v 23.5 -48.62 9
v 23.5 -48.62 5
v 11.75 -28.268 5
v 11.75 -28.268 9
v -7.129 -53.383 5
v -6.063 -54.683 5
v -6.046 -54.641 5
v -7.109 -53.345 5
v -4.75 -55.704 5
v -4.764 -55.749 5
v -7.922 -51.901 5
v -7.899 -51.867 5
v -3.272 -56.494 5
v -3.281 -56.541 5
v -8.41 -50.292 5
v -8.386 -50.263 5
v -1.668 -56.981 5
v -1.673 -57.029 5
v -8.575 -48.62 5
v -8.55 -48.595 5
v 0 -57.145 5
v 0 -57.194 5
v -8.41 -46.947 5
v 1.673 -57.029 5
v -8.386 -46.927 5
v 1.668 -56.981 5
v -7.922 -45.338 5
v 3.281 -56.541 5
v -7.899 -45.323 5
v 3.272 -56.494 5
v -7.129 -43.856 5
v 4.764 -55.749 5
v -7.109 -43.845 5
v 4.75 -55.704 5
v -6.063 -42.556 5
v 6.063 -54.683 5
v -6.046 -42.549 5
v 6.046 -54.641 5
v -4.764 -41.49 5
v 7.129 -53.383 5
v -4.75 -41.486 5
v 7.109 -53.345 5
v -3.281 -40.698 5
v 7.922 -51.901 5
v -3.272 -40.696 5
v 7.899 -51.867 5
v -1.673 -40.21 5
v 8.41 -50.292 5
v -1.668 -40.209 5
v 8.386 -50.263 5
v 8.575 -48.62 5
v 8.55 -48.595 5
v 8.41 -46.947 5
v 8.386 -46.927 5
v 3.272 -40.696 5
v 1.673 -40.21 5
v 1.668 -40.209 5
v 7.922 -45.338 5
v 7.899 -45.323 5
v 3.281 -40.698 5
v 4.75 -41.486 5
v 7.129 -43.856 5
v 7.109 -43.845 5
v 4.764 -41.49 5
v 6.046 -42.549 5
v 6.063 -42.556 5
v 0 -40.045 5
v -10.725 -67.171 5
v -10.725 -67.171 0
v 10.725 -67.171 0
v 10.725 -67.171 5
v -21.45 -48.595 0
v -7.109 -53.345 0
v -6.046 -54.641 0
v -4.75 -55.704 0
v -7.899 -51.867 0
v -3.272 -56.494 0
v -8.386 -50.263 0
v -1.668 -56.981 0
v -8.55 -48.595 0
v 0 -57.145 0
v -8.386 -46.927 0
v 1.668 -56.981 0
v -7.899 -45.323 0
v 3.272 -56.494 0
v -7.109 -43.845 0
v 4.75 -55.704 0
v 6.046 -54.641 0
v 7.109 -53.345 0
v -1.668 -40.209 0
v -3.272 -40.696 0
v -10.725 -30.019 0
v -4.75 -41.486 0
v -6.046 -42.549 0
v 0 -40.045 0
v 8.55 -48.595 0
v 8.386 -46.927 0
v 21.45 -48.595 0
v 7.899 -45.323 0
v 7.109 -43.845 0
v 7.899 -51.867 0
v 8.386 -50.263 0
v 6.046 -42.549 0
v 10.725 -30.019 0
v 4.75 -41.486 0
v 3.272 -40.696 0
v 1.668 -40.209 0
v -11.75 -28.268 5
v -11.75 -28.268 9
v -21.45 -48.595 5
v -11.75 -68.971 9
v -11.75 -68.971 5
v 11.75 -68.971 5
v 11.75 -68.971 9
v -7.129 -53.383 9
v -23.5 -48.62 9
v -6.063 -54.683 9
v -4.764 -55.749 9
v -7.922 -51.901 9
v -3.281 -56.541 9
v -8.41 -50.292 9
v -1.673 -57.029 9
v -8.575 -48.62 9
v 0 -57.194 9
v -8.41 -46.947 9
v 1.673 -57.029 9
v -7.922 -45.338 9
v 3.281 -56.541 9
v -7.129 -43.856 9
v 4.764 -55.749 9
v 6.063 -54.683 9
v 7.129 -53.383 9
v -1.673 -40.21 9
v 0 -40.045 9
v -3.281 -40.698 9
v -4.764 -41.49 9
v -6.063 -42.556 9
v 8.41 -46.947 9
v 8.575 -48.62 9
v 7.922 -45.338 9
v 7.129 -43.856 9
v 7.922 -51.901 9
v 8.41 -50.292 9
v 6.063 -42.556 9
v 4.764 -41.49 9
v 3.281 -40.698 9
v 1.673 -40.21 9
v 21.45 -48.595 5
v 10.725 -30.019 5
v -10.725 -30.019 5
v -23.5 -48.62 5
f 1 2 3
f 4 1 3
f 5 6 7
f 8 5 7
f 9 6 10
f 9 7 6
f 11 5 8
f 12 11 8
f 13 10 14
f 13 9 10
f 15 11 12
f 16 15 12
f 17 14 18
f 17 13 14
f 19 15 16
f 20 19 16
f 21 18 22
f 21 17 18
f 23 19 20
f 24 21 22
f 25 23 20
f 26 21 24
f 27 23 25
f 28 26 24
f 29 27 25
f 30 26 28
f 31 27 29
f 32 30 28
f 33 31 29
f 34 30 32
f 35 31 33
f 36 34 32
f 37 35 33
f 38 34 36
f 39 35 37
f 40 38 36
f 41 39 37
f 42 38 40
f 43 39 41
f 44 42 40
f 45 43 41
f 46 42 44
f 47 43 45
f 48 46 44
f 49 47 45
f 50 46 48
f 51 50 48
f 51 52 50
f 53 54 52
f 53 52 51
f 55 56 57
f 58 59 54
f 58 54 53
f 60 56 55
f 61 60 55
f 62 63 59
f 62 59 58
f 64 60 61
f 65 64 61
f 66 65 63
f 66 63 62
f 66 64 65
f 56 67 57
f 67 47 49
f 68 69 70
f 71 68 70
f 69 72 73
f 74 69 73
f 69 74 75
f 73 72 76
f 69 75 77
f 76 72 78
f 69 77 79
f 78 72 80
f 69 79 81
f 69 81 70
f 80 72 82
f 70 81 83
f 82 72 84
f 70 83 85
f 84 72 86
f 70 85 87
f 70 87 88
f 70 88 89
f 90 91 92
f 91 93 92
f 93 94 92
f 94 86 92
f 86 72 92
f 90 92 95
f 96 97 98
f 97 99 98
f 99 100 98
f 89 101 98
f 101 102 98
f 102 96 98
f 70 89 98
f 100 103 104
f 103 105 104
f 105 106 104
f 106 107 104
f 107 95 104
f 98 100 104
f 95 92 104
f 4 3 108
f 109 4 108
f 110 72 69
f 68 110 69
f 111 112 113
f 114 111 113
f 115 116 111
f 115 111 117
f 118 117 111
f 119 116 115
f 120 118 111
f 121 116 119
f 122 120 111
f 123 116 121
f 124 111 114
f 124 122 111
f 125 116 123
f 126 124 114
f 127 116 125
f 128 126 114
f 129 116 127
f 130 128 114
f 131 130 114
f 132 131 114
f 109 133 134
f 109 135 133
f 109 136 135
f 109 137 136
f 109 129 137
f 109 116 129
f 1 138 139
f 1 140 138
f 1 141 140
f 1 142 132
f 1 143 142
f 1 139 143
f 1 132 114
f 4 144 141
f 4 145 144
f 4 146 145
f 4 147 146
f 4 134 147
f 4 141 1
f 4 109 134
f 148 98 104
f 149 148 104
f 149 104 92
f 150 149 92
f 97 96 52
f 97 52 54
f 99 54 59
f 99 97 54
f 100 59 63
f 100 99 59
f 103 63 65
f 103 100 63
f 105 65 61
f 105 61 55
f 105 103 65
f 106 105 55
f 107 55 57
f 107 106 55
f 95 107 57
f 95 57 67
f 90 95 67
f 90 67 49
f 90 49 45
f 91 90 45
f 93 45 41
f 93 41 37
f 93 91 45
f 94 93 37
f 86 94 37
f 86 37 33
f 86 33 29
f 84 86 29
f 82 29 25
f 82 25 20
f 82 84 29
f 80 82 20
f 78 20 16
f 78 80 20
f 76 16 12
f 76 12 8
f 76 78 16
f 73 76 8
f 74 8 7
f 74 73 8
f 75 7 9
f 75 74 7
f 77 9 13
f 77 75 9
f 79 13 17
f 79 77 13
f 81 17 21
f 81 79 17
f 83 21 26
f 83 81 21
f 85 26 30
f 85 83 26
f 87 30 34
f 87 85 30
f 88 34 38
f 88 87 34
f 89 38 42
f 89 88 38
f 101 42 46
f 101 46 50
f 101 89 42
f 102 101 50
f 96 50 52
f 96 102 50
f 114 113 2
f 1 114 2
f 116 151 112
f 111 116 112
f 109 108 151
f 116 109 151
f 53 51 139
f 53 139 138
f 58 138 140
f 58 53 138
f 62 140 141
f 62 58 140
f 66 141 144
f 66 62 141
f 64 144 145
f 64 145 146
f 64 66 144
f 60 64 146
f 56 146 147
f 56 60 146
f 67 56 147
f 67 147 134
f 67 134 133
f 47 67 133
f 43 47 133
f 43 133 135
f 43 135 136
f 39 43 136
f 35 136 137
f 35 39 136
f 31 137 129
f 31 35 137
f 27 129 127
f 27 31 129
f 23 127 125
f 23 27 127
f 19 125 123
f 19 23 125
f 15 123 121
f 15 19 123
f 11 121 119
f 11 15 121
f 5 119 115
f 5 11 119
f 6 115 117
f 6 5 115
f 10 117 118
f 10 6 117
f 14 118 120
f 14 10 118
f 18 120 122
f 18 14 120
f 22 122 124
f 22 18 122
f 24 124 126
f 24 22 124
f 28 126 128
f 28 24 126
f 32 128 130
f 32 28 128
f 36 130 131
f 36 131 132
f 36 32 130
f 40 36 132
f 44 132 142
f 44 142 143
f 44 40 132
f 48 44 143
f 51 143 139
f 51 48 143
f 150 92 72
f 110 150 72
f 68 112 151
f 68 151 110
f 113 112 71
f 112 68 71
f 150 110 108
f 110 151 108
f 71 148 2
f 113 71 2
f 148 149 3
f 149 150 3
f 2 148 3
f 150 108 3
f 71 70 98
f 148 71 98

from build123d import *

# Parameters (mm, degrees)
SKETCH001_R  = 8.55
PAD001_DEPTH = 5
SKETCH002_R  = 8.574514
PAD_DEPTH    = 4


with BuildPart() as part:
    # Sketch001 → Pad001 (new body)
    with BuildSketch(Plane.XY):
        Polygon((21.45, -48.595033), (10.725, -30.018788), (-10.725, -30.018788), (-21.45, -48.595033), (-10.725, -67.171278), (10.725, -67.171278), align=None)
        with Locations((0, -48.595033)):
            Circle(SKETCH001_R, mode=Mode.SUBTRACT)
    extrude(amount=PAD001_DEPTH)

    # Sketch002 → Pad (join)
    with BuildSketch(Plane.XY.offset(5)):
        Polygon((23.5, -48.619546), (11.75, -28.267949), (-11.75, -28.267949), (-23.5, -48.619546), (-11.75, -68.971143), (11.75, -68.971143), align=None)
        with Locations((0, -48.619546)):
            Circle(SKETCH002_R, mode=Mode.SUBTRACT)
    extrude(amount=PAD_DEPTH)


solid = part.part
